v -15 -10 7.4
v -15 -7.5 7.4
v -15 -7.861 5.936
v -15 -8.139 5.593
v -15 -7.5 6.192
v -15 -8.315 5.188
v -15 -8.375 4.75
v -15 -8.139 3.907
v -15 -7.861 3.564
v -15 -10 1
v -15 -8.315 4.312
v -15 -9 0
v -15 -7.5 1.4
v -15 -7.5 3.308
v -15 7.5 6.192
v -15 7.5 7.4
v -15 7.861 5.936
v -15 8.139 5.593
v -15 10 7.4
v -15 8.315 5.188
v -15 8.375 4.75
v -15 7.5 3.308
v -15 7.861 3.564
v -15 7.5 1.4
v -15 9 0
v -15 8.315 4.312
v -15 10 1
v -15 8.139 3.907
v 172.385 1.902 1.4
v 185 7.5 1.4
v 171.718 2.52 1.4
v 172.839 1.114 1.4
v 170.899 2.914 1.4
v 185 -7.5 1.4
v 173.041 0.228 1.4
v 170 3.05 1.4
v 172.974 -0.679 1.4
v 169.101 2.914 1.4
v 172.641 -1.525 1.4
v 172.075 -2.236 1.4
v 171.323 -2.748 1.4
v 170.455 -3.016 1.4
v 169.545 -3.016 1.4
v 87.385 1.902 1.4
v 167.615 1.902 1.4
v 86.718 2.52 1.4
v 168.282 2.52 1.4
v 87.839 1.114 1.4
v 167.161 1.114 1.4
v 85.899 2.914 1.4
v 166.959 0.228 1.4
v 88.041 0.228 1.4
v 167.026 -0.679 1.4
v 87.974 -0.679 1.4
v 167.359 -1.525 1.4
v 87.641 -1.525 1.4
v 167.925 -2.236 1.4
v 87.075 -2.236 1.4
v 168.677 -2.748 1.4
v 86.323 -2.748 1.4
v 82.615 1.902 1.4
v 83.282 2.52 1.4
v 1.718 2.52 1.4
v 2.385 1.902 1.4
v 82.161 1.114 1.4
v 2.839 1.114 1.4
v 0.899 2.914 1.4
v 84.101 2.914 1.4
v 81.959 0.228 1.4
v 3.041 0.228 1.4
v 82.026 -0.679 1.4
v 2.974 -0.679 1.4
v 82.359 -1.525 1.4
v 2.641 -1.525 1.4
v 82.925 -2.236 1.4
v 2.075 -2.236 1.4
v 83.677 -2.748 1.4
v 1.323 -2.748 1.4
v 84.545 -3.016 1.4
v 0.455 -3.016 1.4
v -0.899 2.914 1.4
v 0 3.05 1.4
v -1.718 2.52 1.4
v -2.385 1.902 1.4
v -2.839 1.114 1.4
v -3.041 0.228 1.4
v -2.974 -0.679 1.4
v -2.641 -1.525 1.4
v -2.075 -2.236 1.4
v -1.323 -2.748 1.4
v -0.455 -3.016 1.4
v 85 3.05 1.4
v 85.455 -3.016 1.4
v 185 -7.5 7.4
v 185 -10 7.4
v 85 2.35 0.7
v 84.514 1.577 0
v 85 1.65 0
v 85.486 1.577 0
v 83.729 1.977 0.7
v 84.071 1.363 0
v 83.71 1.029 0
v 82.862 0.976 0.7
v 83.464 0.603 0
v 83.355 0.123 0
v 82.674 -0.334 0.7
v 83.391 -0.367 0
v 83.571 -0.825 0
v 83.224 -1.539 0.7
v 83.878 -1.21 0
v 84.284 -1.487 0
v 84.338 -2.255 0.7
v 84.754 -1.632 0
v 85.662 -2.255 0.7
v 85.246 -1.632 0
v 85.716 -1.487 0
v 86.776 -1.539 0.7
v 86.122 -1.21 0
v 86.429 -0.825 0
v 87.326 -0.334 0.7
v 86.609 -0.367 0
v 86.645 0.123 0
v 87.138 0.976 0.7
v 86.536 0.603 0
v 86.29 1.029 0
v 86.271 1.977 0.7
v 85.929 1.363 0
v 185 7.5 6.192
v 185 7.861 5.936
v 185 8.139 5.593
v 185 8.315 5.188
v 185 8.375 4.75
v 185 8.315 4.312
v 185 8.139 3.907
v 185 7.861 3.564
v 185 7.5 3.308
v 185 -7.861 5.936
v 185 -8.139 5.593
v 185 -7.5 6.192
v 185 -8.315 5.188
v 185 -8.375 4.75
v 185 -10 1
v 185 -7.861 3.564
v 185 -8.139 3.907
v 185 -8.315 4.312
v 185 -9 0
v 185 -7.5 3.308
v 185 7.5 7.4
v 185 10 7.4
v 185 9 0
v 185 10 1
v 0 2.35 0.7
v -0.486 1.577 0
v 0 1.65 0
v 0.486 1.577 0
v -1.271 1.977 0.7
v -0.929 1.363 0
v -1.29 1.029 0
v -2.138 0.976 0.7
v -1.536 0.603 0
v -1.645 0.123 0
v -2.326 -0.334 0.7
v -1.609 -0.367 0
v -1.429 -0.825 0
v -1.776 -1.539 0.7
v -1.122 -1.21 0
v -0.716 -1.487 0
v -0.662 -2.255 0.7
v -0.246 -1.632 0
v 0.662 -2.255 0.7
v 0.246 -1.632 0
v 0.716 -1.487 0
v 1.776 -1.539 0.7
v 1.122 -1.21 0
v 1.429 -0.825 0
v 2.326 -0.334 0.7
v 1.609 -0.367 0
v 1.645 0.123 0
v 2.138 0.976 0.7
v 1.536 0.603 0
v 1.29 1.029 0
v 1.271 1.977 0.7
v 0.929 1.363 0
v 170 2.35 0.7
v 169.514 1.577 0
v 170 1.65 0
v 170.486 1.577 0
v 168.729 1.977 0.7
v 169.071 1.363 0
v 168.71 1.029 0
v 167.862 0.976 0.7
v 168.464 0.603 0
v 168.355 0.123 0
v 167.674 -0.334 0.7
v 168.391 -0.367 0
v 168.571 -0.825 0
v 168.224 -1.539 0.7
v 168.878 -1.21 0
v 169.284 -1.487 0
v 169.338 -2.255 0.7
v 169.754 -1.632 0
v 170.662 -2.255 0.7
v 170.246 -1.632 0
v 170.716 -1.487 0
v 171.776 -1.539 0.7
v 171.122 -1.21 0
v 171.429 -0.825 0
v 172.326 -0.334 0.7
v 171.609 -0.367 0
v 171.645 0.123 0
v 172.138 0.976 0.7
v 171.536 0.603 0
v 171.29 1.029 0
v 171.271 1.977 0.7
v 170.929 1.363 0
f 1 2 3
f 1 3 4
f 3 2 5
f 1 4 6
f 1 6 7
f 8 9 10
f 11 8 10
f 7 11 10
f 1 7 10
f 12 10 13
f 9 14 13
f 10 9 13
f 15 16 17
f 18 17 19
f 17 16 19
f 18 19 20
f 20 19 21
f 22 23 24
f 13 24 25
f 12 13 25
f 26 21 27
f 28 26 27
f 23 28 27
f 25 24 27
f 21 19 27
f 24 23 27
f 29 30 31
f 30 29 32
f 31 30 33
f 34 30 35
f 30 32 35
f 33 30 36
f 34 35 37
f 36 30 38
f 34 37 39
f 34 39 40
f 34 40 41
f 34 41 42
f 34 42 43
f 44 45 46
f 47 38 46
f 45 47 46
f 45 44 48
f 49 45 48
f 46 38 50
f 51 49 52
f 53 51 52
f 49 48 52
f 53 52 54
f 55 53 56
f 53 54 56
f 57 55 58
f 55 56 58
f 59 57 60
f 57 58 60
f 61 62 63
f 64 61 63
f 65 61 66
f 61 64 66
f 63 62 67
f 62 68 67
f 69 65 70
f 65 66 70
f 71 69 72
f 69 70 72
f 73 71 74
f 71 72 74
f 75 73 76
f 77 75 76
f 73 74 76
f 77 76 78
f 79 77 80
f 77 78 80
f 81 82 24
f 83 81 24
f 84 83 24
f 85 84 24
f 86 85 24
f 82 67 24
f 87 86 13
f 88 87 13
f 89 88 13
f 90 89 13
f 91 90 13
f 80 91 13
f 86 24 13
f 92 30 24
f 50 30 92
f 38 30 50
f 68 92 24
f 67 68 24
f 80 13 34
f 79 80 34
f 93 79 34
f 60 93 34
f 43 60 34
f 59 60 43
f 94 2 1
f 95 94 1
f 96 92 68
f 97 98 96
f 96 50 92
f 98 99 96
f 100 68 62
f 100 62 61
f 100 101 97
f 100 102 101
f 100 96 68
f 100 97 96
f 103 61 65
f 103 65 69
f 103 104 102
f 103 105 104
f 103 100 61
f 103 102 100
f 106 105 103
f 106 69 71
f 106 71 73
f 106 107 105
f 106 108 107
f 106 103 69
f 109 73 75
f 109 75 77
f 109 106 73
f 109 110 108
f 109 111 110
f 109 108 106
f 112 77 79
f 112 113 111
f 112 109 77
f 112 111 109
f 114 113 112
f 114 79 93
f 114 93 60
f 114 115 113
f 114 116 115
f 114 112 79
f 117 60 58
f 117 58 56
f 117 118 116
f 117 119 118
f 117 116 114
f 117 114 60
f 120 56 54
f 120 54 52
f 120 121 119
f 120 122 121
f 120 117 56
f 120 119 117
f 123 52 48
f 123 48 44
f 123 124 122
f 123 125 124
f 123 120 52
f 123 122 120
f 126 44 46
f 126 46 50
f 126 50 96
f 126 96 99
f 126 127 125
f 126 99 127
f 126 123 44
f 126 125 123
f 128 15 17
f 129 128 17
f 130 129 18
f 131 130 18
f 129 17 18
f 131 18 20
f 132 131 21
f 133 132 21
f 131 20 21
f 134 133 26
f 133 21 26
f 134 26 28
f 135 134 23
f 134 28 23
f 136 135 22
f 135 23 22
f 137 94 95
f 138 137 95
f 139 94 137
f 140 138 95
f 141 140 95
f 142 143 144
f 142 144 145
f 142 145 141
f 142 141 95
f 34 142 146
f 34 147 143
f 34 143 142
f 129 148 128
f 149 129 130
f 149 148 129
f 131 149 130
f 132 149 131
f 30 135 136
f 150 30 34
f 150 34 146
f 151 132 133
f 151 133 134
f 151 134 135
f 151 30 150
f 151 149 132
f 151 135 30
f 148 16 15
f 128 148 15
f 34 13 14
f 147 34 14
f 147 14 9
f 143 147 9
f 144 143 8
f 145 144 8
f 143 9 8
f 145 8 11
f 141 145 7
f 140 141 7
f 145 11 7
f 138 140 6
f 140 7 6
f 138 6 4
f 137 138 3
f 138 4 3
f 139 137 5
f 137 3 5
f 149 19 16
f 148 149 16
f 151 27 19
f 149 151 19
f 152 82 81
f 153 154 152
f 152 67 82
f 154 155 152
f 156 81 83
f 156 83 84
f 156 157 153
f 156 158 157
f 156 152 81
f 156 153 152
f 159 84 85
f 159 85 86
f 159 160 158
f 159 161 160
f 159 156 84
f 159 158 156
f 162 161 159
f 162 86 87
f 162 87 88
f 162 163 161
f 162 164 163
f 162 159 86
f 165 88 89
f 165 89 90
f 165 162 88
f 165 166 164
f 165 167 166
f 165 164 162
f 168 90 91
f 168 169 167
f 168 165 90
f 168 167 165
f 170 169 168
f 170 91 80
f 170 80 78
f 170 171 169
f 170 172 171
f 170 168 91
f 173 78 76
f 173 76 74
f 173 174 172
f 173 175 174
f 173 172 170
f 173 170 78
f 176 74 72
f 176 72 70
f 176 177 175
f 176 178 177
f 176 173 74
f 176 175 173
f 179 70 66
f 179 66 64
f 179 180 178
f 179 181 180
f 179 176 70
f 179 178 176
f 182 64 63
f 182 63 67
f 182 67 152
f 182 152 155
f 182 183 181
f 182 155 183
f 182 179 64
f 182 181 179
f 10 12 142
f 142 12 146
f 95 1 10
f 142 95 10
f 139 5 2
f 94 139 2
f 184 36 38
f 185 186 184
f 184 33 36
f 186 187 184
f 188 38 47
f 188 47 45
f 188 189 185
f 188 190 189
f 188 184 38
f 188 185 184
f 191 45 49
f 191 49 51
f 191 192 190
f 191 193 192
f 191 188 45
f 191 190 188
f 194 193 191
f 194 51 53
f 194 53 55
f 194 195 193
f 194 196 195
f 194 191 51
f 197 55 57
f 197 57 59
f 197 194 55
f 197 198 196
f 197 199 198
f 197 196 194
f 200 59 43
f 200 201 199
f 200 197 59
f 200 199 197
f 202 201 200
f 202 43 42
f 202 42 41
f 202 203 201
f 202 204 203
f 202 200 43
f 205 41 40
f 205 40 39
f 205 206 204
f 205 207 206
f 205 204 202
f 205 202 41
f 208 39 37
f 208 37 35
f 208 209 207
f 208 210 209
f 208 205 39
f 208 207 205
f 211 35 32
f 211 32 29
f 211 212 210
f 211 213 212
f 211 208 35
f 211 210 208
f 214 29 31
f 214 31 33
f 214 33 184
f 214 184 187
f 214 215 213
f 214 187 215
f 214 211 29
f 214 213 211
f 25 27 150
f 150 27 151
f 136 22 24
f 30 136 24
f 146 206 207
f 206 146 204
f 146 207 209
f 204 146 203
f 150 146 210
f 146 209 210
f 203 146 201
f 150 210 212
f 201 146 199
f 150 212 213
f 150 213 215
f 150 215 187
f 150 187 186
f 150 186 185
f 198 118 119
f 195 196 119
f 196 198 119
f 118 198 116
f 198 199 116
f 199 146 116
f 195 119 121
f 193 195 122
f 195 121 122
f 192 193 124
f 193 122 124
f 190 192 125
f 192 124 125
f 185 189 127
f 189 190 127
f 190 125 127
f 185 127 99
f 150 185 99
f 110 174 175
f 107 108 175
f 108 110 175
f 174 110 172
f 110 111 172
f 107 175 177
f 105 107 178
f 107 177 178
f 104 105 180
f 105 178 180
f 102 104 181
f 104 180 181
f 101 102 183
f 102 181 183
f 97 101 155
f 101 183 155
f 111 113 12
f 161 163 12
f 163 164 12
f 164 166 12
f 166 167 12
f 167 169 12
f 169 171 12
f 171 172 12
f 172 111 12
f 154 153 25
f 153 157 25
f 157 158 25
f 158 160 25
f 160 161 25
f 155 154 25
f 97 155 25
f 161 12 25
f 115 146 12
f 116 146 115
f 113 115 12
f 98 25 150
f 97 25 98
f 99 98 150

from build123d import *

# Parameters (mm, degrees)
BOSS_EXTRUDE1_DEPTH = 200
CHAMFER1_SIZE       = 1
LPATTERN1_COUNT     = 2
LPATTERN1_PITCH     = 85
LPATTERN2_COUNT     = 2
LPATTERN2_PITCH     = 170


with BuildPart() as part:
    # Sketch1 → Boss-Extrude1 (new body)
    with BuildSketch(Plane(origin=(-15, 0, 0), x_dir=(0, 0, -1), z_dir=(1, 0, 0))):
        with BuildLine():
            Line((-7.4, -7.5), (-7.4, -10))
            Line((-7.4, -10), (0, -10))
            Line((0, -10), (0, 10))
            Line((0, 10), (-7.4, 10))
            Line((-7.4, 10), (-7.4, 7.5))
            Line((-7.4, 7.5), (-6.191570324, 7.5))
            ThreePointArc((-6.191570324, 7.5), (-4.75, 8.375), (-3.308429676, 7.5))
            Line((-3.308429676, 7.5), (-1.4, 7.5))
            Line((-1.4, 7.5), (-1.4, -7.5))
            Line((-1.4, -7.5), (-3.308429676, -7.5))
            ThreePointArc((-3.308429676, -7.5), (-4.75, -8.375), (-6.191570324, -7.5))
            Line((-6.191570324, -7.5), (-7.4, -7.5))
        make_face()
    extrude(amount=BOSS_EXTRUDE1_DEPTH)

    # Chamfer1
    chamfer1_edges = [part.edges().sort_by_distance(p)[0] for p in [
        (85, 10, 0),
        (85, -10, 0),
    ]]
    chamfer(chamfer1_edges, length=CHAMFER1_SIZE)

    # Sketch2 → Cut-Revolve1 (revolve, cut)
    with BuildSketch(Plane(origin=(0, 0, 0), x_dir=(0, 0, -1), z_dir=(1, 0, 0))):
        Polygon((-1.4, 3.05), (0, 1.65), (0, 0), (-1.4, 0), align=None)
    cut_revolve1 = revolve(axis=Axis((0, 0, 0), (0, 0, 1)), mode=Mode.SUBTRACT)

    # LPattern1: Cut-Revolve1 ×2
    with Locations(*[(i * LPATTERN1_PITCH, 0, 0) for i in range(1, LPATTERN1_COUNT)]):
        add(cut_revolve1, mode=Mode.SUBTRACT)

    # LPattern2: Cut-Revolve1 ×2
    with Locations(*[(i * LPATTERN2_PITCH, 0, 0) for i in range(1, LPATTERN2_COUNT)]):
        add(cut_revolve1, mode=Mode.SUBTRACT)


solid = part.part
